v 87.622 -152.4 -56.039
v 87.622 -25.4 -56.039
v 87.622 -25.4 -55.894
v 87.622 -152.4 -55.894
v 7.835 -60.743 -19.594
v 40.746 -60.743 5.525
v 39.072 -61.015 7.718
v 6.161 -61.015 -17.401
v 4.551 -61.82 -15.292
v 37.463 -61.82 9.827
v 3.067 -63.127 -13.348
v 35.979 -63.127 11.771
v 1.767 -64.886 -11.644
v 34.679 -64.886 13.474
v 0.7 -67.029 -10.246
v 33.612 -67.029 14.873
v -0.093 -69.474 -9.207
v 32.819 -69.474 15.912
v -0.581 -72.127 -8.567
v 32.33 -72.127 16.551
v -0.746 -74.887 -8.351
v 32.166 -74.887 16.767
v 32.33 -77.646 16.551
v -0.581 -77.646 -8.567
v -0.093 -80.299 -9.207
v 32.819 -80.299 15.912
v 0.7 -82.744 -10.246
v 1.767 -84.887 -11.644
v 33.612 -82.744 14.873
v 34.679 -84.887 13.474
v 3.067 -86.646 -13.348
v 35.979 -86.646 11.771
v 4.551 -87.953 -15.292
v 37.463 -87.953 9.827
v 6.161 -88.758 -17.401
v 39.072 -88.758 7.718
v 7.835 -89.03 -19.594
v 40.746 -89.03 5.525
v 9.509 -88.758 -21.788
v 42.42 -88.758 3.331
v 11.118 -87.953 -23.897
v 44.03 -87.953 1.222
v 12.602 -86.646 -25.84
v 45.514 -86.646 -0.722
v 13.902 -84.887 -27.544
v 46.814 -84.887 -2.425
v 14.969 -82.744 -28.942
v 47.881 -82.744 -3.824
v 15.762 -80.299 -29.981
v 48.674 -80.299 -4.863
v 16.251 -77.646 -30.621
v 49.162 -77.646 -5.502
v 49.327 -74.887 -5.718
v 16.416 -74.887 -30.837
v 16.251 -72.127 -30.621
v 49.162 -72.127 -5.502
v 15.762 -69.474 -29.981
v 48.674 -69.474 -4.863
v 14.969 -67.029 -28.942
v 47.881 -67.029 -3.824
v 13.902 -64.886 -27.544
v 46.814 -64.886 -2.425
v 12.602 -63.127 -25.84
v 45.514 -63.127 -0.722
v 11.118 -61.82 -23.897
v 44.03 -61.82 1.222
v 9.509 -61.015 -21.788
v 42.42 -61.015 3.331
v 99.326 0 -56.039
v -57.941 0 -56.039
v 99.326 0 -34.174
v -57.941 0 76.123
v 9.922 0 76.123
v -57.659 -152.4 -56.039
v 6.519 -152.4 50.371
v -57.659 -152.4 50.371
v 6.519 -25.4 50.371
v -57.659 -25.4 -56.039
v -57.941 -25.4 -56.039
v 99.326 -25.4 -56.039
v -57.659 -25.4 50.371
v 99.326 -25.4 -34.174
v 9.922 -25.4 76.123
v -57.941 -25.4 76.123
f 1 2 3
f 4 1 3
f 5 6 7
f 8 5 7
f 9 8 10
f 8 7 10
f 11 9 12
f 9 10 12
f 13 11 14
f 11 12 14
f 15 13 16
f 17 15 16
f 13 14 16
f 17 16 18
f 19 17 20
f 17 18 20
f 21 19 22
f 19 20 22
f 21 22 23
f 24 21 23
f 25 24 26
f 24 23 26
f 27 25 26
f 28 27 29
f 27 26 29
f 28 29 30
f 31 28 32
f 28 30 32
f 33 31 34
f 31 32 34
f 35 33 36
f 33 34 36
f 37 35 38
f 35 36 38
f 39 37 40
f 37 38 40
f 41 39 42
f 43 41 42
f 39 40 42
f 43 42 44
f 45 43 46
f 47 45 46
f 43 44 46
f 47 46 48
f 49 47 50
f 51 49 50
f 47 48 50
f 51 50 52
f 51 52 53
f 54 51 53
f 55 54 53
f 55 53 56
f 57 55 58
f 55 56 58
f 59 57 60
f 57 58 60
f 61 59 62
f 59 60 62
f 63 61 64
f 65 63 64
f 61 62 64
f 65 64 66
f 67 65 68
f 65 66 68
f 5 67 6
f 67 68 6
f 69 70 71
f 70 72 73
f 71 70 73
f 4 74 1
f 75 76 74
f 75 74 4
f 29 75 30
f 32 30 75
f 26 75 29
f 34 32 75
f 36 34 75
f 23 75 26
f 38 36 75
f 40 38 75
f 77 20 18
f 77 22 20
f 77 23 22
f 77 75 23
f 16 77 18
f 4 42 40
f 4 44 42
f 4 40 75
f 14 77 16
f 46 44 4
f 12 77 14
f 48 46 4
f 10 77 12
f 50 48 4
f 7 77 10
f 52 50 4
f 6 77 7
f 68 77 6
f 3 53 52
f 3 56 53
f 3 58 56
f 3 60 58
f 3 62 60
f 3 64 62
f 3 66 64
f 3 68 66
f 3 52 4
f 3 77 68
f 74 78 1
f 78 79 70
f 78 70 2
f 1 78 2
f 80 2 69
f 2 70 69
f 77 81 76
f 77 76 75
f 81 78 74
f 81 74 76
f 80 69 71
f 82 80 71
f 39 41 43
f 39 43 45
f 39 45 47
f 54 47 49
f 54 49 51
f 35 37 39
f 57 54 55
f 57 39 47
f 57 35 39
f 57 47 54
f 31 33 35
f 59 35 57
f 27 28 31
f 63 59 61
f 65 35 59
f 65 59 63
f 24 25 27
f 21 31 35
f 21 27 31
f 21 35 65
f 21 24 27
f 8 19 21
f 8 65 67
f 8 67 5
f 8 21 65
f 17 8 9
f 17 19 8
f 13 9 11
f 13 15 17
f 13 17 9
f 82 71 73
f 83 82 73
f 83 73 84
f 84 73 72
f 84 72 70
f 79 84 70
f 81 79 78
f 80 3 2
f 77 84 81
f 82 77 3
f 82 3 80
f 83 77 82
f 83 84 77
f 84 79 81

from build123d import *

# Parameters (mm, degrees)
F0_W          = 145.2813223004
F0_H          = 106.4100638032
F1_DEPTH      = 152.4
F3_DEPTH      = 25.4
F3_DEPTH_BACK = 193.04
F4_R          = 14.1433096913
F5_DEPTH      = 41.402
F7_DEPTH      = 25.4


with BuildPart() as f1:
    # F0 (on Front) → F1 (new body)
    with BuildSketch(Plane.XZ):
        with Locations((14.9816311896, -2.8343647718)):
            Rectangle(F0_W, F0_H)
    extrude(amount=F1_DEPTH)

    # F2 (on Front) → F3 (cut, two sides)
    with BuildSketch(Plane.XZ) as f3_sk:
        Polygon((91.3226157427, 59.4377643871), (0, 58.912049979), (91.3226157427, -60.7426390052), align=None)
    extrude(amount=-F3_DEPTH, mode=Mode.SUBTRACT)
    extrude(f3_sk.sketch, amount=F3_DEPTH_BACK, mode=Mode.SUBTRACT)

    # F4 (on face) → F5 (cut)
    with BuildSketch(Plane(origin=(28.4124414854, 0, 21.6848875552), x_dir=(0, 1, 0), z_dir=(0.794928192, 0, 0.6067035269))):
        with Locations((-74.8865753412, -20.3293599188)):
            Circle(F4_R)
    extrude(amount=-F5_DEPTH, mode=Mode.SUBTRACT)

    # F6 (on Front) → F7 (join)
    with BuildSketch(Plane.XZ):
        Polygon((9.9221970886, 76.122879982), (-57.940531522, 76.122879982), (-57.940531522, -56.0393966734), (99.3260890245, -56.0393966734), (99.3260890245, -34.1743119061), align=None)
    extrude(amount=F7_DEPTH)


solid = f1.part
